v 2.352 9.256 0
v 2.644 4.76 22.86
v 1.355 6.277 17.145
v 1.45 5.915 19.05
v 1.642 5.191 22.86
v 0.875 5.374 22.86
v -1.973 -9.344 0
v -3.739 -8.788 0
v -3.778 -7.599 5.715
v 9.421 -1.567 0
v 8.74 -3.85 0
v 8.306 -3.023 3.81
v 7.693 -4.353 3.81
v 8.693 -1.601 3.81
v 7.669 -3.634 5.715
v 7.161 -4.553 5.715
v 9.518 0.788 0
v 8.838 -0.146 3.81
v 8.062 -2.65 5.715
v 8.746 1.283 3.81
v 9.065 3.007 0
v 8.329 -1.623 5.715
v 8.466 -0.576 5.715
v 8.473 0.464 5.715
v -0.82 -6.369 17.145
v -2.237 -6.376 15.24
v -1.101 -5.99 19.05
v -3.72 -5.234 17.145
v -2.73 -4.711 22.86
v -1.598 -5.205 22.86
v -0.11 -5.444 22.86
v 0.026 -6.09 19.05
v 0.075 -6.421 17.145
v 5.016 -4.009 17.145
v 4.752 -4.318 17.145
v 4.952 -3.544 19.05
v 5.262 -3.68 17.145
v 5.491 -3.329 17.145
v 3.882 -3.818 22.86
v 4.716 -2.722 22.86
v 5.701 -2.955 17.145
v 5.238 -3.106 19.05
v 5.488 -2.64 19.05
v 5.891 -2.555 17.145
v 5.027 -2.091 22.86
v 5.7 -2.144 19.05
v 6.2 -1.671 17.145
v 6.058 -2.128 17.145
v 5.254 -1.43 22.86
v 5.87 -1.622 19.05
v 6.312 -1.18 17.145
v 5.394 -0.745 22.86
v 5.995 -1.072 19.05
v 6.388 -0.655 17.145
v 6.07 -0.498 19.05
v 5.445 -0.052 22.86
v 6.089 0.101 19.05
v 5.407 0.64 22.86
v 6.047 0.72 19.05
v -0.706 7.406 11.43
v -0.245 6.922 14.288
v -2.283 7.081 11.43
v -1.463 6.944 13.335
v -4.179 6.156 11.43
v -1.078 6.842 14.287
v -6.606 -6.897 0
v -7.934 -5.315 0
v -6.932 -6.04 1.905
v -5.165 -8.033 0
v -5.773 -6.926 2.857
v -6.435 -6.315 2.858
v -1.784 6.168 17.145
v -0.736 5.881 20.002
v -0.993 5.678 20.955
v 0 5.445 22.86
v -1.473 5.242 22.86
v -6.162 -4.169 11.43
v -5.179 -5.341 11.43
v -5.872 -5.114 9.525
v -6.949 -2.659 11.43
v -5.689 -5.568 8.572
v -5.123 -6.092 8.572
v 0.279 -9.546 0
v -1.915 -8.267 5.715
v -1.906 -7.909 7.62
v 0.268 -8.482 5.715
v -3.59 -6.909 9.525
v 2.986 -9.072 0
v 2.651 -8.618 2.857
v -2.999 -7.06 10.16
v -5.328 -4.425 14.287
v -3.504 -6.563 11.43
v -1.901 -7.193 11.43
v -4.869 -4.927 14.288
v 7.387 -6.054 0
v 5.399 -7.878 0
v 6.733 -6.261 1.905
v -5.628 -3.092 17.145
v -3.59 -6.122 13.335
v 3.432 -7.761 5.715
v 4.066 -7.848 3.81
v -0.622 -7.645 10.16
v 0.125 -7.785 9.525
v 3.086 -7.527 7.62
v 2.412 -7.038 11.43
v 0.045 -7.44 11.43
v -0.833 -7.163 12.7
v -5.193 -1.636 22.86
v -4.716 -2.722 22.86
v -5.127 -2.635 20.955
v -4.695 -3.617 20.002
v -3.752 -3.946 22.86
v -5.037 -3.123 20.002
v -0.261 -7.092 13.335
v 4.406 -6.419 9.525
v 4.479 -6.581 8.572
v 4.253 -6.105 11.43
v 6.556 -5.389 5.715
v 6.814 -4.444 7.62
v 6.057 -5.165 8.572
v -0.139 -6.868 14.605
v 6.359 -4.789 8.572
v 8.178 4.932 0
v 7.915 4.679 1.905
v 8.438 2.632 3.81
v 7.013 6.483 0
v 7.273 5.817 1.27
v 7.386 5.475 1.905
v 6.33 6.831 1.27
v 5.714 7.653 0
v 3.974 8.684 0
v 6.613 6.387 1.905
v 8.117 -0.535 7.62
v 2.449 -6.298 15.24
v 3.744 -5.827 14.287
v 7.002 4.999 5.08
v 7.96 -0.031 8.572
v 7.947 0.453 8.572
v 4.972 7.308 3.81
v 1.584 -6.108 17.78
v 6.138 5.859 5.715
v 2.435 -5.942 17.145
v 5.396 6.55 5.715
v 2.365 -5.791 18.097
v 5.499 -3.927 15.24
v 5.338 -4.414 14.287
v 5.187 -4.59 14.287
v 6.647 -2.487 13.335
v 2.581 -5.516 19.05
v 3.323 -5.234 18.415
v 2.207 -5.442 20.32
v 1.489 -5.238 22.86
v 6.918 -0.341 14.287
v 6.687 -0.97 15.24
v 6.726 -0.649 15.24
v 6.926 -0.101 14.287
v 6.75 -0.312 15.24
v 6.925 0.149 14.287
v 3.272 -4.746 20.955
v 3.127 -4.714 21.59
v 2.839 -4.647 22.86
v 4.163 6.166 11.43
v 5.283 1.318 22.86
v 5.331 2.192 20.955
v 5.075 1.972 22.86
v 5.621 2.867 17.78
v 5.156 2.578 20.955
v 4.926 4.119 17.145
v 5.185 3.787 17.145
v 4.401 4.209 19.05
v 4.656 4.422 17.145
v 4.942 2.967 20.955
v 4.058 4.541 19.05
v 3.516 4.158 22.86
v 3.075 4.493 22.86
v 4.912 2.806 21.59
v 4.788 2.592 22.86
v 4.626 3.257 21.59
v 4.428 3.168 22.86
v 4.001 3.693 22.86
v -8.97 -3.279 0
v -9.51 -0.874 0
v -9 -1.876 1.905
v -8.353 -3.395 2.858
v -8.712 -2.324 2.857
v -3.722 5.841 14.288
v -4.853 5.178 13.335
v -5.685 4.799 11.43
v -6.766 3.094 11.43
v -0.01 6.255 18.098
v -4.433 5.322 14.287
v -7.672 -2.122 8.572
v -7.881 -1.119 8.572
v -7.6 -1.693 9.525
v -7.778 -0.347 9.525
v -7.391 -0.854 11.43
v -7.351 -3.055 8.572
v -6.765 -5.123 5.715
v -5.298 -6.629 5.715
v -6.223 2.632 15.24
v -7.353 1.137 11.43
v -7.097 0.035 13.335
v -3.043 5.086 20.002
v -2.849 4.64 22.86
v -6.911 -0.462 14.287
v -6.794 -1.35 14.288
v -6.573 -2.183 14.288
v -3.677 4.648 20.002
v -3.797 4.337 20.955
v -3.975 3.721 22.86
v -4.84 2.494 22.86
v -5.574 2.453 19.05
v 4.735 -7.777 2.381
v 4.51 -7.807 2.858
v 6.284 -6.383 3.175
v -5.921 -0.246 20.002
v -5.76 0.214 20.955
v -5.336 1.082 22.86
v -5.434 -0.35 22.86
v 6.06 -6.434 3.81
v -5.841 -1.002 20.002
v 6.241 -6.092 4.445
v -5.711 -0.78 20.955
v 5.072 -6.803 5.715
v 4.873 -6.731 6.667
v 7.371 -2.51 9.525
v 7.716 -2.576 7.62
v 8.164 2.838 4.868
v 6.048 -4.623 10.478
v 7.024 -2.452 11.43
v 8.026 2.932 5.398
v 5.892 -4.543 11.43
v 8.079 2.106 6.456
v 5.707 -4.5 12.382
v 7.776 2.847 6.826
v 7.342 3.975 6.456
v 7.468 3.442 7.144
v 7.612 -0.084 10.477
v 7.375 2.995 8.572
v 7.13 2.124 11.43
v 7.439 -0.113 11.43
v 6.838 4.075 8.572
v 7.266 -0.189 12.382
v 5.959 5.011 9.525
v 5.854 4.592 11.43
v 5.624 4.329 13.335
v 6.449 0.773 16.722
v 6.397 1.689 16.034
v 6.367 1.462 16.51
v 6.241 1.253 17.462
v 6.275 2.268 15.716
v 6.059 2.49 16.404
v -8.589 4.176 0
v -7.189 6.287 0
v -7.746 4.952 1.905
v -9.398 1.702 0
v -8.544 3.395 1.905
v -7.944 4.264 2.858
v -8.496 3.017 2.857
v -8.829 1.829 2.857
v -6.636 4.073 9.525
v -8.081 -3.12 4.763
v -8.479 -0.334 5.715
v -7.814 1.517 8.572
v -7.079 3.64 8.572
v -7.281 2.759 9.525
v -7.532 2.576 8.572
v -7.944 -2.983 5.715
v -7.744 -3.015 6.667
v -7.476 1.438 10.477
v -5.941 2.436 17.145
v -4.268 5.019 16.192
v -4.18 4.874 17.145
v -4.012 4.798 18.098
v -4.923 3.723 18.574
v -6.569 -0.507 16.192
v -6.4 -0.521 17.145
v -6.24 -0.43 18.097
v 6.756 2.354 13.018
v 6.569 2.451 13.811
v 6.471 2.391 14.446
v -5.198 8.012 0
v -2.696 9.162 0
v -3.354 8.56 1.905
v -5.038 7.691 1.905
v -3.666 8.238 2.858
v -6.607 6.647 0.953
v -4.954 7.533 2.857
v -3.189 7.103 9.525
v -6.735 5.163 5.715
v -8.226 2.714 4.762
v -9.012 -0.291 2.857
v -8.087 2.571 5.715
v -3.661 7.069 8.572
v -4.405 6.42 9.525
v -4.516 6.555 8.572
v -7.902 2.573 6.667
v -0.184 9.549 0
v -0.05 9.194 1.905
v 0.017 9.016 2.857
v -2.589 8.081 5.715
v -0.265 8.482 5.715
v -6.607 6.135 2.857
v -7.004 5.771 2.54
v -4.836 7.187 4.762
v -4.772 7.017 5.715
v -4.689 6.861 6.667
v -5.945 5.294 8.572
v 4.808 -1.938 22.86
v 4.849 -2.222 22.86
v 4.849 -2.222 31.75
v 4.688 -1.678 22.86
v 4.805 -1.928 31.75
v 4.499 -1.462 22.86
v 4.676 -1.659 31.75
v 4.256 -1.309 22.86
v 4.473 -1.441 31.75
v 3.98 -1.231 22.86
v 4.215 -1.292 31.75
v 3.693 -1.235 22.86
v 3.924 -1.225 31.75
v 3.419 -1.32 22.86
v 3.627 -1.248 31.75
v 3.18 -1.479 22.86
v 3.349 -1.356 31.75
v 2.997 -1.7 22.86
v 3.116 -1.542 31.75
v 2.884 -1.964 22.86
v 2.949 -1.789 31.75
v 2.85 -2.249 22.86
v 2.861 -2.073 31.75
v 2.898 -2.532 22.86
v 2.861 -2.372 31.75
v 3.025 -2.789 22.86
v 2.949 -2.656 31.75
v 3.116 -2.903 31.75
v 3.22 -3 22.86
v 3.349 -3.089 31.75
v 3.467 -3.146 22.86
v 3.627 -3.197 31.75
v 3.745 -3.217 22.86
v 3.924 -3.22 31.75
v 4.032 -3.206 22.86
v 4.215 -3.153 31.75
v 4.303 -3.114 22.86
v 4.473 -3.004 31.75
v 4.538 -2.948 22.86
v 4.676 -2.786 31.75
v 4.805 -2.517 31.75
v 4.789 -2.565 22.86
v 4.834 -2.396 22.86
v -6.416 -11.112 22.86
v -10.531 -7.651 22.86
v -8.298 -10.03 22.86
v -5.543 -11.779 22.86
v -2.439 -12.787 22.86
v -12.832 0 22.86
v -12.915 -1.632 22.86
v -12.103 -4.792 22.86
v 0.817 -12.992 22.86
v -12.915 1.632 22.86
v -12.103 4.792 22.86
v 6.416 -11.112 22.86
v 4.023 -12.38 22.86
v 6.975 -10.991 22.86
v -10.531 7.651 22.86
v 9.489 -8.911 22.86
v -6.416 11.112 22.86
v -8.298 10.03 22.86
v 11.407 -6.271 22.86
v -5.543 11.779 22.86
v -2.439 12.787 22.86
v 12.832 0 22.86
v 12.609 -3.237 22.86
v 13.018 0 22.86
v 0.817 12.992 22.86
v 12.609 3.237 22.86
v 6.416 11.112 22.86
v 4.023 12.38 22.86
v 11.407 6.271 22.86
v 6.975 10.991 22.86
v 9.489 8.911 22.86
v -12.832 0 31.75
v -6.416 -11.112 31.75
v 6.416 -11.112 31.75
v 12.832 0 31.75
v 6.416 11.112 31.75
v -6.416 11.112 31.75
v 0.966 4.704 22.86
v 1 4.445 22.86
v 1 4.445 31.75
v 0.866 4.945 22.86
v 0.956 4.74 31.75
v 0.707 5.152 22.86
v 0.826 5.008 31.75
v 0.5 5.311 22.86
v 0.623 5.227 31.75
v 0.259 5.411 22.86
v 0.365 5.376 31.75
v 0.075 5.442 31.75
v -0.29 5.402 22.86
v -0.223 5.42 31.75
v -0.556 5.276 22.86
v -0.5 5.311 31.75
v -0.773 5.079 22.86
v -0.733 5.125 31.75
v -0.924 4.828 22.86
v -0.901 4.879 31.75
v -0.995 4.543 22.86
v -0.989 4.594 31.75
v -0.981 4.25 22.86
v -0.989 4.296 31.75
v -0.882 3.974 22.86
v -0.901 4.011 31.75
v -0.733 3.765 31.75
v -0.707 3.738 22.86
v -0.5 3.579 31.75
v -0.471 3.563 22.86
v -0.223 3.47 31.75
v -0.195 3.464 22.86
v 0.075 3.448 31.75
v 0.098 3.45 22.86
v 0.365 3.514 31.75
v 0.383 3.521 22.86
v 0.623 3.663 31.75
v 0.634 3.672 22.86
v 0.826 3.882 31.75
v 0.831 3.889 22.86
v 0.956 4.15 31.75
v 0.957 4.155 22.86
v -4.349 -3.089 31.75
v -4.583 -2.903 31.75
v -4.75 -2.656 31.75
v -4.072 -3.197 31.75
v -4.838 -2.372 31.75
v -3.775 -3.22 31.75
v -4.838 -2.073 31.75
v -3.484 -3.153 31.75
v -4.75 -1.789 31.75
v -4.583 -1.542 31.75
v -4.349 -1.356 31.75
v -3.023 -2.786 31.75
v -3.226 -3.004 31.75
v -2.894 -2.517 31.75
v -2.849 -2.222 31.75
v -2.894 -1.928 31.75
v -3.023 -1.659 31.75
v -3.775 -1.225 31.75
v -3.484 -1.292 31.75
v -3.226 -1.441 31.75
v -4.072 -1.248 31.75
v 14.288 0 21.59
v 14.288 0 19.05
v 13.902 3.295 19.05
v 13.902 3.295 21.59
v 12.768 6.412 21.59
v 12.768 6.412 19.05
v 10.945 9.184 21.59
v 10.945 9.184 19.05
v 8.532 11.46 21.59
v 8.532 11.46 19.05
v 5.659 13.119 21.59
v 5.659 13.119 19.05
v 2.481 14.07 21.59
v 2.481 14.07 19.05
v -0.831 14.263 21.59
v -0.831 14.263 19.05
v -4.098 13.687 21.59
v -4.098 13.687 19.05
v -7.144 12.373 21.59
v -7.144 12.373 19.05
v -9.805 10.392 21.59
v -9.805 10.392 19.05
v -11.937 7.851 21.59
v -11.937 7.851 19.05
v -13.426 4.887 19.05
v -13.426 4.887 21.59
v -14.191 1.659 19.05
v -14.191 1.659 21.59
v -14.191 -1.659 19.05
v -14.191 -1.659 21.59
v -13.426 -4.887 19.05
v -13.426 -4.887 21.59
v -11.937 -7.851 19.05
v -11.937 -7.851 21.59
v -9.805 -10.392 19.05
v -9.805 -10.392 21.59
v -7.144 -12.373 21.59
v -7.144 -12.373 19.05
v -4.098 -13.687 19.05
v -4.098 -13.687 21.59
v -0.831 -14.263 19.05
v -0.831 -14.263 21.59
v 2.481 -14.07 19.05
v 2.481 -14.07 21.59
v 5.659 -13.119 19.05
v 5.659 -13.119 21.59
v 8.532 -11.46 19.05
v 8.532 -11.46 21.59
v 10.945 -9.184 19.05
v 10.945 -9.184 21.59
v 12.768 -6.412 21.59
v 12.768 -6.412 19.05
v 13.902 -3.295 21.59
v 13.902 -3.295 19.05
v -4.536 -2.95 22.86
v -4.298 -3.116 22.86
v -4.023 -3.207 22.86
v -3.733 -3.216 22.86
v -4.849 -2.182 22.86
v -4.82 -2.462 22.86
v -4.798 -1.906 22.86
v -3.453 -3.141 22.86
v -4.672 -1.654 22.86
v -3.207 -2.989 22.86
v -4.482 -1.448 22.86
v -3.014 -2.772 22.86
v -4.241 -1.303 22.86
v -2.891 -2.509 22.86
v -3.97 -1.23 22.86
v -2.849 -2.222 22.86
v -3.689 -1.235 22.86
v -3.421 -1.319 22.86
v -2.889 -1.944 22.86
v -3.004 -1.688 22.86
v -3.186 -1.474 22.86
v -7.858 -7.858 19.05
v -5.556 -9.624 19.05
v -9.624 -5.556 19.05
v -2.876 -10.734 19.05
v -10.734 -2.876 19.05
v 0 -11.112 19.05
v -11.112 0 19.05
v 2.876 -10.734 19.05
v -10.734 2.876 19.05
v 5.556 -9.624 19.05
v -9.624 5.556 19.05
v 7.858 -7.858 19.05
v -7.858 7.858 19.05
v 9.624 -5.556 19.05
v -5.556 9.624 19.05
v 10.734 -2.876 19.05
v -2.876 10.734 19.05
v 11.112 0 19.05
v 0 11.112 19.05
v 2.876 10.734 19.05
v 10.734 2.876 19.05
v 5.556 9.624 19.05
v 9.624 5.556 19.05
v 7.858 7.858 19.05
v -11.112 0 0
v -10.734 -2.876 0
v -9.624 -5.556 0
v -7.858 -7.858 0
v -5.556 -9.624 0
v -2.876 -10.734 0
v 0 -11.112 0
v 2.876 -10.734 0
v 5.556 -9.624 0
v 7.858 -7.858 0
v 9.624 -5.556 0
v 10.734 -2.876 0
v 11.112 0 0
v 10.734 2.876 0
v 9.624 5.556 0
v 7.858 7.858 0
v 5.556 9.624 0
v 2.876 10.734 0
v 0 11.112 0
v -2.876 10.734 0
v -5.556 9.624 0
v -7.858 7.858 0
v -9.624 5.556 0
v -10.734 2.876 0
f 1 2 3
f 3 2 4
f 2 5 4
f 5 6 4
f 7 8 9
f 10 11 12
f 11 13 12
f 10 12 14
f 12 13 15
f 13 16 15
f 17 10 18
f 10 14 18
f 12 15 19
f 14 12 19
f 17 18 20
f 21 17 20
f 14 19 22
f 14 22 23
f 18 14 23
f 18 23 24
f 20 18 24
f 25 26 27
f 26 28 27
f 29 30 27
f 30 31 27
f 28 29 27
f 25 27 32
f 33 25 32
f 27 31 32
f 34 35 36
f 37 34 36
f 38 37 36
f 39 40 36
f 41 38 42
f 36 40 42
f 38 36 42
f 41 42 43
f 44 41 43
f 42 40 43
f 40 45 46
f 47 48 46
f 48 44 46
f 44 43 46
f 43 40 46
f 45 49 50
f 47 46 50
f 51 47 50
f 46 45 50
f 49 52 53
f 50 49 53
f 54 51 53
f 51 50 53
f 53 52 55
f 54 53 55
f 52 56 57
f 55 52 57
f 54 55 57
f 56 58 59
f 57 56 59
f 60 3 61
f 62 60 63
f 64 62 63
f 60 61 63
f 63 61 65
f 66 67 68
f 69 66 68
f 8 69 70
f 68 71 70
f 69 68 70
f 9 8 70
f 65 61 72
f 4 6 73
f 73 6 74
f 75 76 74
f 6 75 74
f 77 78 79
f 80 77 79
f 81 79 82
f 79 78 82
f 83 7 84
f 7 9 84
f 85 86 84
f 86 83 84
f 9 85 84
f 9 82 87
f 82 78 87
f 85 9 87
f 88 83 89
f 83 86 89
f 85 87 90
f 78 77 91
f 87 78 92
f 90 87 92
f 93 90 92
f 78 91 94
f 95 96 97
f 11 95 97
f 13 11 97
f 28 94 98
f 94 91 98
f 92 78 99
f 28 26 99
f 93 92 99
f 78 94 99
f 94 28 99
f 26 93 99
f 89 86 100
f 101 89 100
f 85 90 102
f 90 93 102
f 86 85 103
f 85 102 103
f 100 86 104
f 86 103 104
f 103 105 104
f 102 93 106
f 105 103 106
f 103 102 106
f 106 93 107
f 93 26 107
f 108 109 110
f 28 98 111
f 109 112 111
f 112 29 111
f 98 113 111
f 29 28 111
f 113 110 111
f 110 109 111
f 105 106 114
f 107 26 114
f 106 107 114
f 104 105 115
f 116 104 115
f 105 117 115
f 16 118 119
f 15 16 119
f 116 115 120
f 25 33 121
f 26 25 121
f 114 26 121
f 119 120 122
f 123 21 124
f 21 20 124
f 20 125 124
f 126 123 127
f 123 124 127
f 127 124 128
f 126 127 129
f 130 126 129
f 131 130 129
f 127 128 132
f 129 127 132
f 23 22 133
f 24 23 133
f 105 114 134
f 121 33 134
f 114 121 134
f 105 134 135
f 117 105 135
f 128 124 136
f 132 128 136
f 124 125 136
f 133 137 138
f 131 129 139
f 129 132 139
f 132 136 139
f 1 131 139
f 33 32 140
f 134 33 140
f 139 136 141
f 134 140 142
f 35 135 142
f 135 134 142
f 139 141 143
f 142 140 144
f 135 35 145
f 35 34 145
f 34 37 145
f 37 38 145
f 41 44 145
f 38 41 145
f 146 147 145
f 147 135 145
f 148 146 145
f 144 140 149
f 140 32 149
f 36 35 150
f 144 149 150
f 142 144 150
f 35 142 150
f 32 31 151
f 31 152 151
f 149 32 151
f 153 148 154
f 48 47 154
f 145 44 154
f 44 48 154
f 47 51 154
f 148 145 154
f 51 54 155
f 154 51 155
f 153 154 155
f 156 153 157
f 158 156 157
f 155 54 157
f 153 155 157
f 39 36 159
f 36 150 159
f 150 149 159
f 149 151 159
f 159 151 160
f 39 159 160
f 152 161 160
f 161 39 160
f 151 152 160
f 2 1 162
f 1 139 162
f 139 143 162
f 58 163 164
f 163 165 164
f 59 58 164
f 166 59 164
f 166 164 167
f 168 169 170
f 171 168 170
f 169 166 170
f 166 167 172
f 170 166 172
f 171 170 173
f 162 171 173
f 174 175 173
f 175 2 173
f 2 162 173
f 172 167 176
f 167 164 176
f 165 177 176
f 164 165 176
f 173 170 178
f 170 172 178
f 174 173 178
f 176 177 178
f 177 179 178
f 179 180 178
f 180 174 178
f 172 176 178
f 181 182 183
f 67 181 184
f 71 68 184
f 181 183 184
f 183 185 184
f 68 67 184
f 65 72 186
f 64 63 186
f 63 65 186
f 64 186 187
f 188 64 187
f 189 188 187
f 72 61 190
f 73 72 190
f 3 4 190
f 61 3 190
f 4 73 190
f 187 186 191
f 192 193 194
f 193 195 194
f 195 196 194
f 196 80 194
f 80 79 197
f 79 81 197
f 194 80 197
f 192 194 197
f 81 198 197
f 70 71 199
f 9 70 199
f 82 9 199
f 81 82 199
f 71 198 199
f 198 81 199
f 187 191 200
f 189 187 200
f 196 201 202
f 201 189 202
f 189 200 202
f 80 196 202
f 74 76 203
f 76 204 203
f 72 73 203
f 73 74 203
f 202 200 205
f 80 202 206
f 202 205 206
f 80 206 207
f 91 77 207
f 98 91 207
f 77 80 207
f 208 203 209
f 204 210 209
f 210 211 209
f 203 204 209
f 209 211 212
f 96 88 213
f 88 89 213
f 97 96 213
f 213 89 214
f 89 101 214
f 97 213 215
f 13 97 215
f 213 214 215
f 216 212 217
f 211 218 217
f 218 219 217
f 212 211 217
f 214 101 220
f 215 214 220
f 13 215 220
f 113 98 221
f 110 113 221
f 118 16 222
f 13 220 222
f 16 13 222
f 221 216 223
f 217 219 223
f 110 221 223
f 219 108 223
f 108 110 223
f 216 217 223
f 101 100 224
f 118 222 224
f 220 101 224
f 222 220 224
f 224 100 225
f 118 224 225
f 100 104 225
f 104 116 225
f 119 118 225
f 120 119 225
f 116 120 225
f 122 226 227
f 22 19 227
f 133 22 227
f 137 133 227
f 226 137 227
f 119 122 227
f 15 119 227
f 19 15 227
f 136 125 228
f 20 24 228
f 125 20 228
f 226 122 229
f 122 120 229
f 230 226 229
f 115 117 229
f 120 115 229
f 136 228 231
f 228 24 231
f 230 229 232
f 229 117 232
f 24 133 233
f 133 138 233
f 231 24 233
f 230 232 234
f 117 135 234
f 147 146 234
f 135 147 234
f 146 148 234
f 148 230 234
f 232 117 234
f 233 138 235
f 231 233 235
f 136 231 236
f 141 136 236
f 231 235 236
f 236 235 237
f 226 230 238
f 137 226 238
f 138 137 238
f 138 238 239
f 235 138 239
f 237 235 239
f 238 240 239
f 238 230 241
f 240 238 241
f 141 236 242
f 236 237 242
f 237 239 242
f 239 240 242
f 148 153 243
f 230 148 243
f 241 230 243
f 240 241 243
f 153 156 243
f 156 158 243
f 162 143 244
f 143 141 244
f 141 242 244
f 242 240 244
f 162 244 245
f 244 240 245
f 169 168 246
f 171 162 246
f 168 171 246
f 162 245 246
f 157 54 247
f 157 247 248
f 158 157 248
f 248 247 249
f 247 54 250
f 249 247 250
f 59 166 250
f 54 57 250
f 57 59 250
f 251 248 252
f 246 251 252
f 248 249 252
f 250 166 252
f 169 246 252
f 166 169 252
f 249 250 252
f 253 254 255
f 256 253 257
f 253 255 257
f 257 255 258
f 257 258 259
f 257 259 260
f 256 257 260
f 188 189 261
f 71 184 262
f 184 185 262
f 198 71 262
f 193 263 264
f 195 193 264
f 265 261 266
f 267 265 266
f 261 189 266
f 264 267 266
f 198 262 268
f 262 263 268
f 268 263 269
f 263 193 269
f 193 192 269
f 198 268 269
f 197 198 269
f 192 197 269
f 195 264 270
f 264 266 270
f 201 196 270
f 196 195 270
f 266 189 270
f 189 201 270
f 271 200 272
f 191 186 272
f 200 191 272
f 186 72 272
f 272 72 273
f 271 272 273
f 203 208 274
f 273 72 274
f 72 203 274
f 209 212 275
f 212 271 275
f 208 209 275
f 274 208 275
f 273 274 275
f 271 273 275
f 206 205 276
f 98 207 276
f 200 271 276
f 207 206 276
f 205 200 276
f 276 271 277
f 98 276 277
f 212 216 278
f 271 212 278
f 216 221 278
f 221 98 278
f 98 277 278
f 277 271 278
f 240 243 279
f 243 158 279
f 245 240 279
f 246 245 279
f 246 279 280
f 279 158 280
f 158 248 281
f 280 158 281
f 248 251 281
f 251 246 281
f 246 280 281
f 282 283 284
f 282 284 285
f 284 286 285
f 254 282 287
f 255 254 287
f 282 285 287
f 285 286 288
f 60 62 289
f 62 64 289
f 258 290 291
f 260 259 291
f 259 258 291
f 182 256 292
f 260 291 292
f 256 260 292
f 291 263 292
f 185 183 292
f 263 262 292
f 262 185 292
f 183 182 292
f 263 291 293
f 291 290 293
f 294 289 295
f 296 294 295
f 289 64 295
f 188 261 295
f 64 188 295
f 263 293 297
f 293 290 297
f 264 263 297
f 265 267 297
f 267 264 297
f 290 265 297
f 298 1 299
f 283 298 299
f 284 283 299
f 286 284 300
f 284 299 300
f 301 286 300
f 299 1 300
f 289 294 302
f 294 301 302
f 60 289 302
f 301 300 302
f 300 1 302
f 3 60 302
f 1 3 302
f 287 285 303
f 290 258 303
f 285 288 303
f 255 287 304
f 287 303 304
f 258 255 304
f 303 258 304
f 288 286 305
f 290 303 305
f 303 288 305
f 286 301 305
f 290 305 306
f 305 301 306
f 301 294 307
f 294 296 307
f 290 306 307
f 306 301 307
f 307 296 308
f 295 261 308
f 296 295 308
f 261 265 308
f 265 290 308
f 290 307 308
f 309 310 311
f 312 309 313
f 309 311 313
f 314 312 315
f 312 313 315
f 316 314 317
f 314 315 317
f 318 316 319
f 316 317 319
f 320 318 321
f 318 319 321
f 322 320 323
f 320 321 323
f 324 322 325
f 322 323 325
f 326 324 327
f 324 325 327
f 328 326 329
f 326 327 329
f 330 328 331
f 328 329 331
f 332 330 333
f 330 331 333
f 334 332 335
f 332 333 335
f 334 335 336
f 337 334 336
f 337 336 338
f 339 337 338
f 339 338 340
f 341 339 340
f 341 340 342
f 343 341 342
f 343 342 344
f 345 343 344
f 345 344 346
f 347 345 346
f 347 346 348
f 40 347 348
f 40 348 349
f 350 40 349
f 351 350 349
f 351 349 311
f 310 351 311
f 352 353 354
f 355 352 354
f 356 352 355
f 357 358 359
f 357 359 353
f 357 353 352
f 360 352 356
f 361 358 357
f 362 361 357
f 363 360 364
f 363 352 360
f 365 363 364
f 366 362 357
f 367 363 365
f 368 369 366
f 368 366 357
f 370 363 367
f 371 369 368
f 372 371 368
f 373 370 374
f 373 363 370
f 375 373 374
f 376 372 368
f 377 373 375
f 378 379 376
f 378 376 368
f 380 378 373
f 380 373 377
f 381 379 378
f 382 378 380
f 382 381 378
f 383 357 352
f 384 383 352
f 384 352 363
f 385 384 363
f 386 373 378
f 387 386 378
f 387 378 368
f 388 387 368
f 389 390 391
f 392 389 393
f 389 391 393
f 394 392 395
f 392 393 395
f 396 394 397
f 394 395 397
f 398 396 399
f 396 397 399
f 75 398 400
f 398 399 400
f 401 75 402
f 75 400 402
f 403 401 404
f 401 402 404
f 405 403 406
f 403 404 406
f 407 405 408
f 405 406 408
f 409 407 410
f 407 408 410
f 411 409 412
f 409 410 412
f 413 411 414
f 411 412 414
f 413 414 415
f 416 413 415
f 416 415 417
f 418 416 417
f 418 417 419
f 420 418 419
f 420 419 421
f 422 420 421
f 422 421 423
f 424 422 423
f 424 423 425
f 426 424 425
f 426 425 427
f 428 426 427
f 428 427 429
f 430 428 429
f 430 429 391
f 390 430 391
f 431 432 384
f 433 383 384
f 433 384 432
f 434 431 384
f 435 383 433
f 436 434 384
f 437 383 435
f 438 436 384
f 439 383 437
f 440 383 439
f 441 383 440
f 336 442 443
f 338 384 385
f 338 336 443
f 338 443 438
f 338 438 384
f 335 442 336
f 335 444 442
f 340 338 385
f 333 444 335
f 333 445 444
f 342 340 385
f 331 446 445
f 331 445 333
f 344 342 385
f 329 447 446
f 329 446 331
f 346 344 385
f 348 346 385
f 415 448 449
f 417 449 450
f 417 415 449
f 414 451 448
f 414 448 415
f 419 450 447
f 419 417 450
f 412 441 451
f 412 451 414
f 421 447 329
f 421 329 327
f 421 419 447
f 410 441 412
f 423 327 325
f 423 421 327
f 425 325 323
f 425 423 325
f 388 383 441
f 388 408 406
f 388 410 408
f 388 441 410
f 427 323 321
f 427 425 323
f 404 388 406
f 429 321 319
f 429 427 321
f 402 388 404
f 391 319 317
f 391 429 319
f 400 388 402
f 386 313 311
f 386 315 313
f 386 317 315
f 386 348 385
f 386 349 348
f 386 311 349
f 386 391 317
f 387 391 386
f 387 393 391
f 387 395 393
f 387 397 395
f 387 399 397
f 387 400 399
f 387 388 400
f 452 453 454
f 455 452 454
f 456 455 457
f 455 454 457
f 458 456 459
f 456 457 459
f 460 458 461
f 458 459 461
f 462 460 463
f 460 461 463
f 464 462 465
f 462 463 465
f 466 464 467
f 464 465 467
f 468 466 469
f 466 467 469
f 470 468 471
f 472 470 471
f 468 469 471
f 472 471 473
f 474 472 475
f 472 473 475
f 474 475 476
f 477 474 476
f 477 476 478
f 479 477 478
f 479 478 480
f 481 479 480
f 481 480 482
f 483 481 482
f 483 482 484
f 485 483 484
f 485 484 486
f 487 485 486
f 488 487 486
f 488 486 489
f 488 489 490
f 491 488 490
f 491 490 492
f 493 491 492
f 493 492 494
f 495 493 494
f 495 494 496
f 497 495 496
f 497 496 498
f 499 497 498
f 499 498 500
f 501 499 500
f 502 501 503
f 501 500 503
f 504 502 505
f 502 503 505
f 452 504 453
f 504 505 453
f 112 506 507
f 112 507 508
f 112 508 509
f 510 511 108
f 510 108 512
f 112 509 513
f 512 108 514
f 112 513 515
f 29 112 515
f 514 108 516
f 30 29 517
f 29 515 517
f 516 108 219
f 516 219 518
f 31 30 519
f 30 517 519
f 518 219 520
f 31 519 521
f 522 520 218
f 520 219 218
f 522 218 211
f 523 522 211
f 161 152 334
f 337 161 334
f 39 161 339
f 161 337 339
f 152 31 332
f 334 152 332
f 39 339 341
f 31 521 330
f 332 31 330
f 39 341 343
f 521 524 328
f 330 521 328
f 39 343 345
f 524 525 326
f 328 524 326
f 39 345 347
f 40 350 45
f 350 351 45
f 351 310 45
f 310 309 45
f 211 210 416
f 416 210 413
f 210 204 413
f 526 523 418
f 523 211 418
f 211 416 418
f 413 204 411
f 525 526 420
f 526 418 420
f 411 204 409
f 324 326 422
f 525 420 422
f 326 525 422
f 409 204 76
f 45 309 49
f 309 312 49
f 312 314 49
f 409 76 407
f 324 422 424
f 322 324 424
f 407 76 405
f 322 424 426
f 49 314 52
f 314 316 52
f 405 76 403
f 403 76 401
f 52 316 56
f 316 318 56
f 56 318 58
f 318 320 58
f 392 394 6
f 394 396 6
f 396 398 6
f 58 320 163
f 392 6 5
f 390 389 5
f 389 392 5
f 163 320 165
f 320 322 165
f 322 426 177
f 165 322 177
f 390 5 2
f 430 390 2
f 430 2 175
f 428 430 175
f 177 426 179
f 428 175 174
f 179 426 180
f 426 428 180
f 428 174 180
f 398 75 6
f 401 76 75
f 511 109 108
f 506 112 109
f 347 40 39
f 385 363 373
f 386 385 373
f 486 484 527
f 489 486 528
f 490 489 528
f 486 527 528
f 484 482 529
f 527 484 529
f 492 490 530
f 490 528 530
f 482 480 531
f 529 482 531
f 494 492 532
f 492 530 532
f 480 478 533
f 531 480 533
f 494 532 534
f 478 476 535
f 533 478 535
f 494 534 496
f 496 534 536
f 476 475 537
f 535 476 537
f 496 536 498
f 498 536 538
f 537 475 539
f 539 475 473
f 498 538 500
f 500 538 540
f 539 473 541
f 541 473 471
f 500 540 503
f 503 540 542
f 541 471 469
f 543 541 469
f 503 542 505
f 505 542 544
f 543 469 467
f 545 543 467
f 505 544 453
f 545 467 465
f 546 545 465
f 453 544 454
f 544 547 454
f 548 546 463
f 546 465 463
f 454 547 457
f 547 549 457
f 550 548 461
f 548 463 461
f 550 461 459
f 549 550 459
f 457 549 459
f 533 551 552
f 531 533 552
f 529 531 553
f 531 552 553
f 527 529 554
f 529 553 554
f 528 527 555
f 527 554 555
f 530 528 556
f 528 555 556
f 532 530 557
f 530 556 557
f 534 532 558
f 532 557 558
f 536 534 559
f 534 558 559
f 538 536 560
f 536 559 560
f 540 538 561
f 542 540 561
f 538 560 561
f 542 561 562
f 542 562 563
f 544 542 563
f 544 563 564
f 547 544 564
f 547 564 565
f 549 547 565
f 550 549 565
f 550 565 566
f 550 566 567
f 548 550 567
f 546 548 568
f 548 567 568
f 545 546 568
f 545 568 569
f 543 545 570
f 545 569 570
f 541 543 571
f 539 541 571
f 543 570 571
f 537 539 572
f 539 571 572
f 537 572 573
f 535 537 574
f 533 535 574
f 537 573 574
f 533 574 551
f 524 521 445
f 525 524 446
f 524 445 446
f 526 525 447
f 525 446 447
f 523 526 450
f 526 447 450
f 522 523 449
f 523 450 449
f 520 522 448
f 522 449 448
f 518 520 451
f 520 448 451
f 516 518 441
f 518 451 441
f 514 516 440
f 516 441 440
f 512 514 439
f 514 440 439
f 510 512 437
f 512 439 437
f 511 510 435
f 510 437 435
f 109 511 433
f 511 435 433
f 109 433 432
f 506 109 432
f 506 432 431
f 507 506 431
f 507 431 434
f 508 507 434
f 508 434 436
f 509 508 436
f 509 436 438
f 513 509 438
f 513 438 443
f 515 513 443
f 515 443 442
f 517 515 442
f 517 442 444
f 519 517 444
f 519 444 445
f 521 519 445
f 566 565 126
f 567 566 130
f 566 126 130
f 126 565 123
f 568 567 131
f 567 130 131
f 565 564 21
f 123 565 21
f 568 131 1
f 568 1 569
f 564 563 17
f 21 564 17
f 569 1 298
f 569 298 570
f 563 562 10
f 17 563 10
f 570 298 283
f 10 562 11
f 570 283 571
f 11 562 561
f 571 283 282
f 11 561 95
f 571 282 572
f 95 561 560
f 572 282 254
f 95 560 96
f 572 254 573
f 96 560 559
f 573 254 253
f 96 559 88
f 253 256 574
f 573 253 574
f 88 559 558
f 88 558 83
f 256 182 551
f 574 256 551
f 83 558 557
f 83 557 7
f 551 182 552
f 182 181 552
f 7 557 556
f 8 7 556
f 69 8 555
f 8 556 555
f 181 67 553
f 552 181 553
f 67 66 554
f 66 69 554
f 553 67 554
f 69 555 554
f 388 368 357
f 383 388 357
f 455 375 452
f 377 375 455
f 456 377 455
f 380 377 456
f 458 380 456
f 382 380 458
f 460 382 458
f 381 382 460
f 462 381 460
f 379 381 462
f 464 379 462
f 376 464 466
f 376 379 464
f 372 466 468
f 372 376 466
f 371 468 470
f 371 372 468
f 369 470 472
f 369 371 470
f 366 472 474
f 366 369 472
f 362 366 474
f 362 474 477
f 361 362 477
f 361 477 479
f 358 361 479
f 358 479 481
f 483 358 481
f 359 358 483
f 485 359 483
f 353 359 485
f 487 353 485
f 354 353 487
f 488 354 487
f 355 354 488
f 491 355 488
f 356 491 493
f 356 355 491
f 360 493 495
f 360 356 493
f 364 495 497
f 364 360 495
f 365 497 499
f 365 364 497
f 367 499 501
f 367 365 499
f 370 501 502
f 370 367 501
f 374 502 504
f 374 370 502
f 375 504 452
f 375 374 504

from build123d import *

# Parameters (mm, degrees)
SKETCH1_R           = 11.1125
BOSS_EXTRUDE1_DEPTH = 19.05
SKETCH2_R           = 14.2875
BOSS_EXTRUDE2_DEPTH = 12.7
CUT_EXTRUDE1_START  = -8.89
SKETCH3_R           = 14.2875
CUT_EXTRUDE1_DEPTH  = 8.89
CHAMFER1_SIZE       = 1.27
CUT_EXTRUDE2_REACH  = 39.634
SKETCH4_R           = 1


with BuildPart() as part:
    # Sketch1 → Boss-Extrude1 (new body)
    with BuildSketch(Plane.XY):
        with Locations(Location((0, 0, 0), (0, 0, 180))):
            Circle(SKETCH1_R)
    extrude(amount=BOSS_EXTRUDE1_DEPTH)

    # Sketch2 → Boss-Extrude2 (add)
    with BuildSketch(Plane.XY.offset(19.05)):
        Circle(SKETCH2_R)
    extrude(amount=BOSS_EXTRUDE2_DEPTH)

    # Sketch3 → Cut-Extrude1 (cut)
    with BuildSketch(Plane.XY.offset(31.75).offset(CUT_EXTRUDE1_START)):
        Circle(SKETCH3_R)
        Polygon((12.831609733, 0), (6.415804866, 11.1125), (-6.415804866, 11.1125), (-12.831609733, 0), (-6.415804866, -11.1125), (6.415804866, -11.1125), align=None, mode=Mode.SUBTRACT)
    extrude(amount=CUT_EXTRUDE1_DEPTH, mode=Mode.SUBTRACT)

    # Chamfer1
    chamfer1_edges = [part.edges().sort_by_distance(p)[0] for p in [
        (-14.2875, 0, 22.86),
    ]]
    chamfer(chamfer1_edges, length=CHAMFER1_SIZE)

    # Cut-Loft1: read off the stored shape, not the designer's step
    # Cut-Loft1: loft between two sections, ruled curve by curve
    cut_loft1_from = [
        Edge.make_bspline([(2.35183174, 9.256296648, 0), (-16.160761555, 13.959960127, 0), (-20.864425035, -4.552633168, 0), (-2.35183174, -9.256296648, 0), (16.160761555, -13.959960127, 0), (20.864425035, 4.552633168, 0), (2.35183174, 9.256296648, 0)], [0, 0, 0, 0, 0.5, 0.5, 0.5, 1, 1, 1, 1], 3, [1, 0.333333333, 0.333333333, 1, 0.333333333, 0.333333333, 1]),
    ]
    cut_loft1_to = [
        Edge.make_bspline([(2.644109425, 4.759906548, 22.86), (-6.875703672, 10.048125398, 22.86), (-12.163922522, 0.528312301, 22.86), (-2.644109425, -4.759906548, 22.86), (6.875703672, -10.048125398, 22.86), (12.163922522, -0.528312301, 22.86), (2.644109425, 4.759906548, 22.86)], [0, 0, 0, 0, 0.5, 0.5, 0.5, 1, 1, 1, 1], 3, [1, 0.333333333, 0.333333333, 1, 0.333333333, 0.333333333, 1]),
    ]
    cut_loft1 = Solid(Shell([*[Face.make_surface_from_curves(cut_loft1_from[k], cut_loft1_to[k]) for k in range(1)], Face(Wire(cut_loft1_from)), Face(Wire(cut_loft1_to))]))
    add(cut_loft1, mode=Mode.SUBTRACT)

    # Sketch4 → Cut-Extrude2 (cut, up to next)
    with BuildSketch(Plane.XY.offset(31.75), mode=Mode.PRIVATE) as cut_extrude2_sk1:
        with Locations((0, 4.445)):
            Circle(SKETCH4_R)
    cut_extrude2_tool1 = extrude(cut_extrude2_sk1.sketch, amount=-CUT_EXTRUDE2_REACH, mode=Mode.PRIVATE) & part.part
    # Sketch4 → Cut-Extrude2 (cut, up to next)
    with BuildSketch(Plane.XY.offset(31.75), mode=Mode.PRIVATE) as cut_extrude2_sk2:
        with Locations((3.84948292, -2.2225)):
            Circle(SKETCH4_R)
    cut_extrude2_tool2 = extrude(cut_extrude2_sk2.sketch, amount=-CUT_EXTRUDE2_REACH, mode=Mode.PRIVATE) & part.part
    # Sketch4 → Cut-Extrude2 (cut, up to next)
    with BuildSketch(Plane.XY.offset(31.75), mode=Mode.PRIVATE) as cut_extrude2_sk3:
        with Locations((-3.84948292, -2.2225)):
            Circle(SKETCH4_R)
    cut_extrude2_tool3 = extrude(cut_extrude2_sk3.sketch, amount=-CUT_EXTRUDE2_REACH, mode=Mode.PRIVATE) & part.part
    add(cut_extrude2_tool1.solids().sort_by_distance((0, 4.445, 31.75))[0], mode=Mode.SUBTRACT)
    add(cut_extrude2_tool2.solids().sort_by_distance((3.849483, -2.2225, 31.75))[0], mode=Mode.SUBTRACT)
    add(cut_extrude2_tool3.solids().sort_by_distance((-3.849483, -2.2225, 31.75))[0], mode=Mode.SUBTRACT)


solid = part.part
